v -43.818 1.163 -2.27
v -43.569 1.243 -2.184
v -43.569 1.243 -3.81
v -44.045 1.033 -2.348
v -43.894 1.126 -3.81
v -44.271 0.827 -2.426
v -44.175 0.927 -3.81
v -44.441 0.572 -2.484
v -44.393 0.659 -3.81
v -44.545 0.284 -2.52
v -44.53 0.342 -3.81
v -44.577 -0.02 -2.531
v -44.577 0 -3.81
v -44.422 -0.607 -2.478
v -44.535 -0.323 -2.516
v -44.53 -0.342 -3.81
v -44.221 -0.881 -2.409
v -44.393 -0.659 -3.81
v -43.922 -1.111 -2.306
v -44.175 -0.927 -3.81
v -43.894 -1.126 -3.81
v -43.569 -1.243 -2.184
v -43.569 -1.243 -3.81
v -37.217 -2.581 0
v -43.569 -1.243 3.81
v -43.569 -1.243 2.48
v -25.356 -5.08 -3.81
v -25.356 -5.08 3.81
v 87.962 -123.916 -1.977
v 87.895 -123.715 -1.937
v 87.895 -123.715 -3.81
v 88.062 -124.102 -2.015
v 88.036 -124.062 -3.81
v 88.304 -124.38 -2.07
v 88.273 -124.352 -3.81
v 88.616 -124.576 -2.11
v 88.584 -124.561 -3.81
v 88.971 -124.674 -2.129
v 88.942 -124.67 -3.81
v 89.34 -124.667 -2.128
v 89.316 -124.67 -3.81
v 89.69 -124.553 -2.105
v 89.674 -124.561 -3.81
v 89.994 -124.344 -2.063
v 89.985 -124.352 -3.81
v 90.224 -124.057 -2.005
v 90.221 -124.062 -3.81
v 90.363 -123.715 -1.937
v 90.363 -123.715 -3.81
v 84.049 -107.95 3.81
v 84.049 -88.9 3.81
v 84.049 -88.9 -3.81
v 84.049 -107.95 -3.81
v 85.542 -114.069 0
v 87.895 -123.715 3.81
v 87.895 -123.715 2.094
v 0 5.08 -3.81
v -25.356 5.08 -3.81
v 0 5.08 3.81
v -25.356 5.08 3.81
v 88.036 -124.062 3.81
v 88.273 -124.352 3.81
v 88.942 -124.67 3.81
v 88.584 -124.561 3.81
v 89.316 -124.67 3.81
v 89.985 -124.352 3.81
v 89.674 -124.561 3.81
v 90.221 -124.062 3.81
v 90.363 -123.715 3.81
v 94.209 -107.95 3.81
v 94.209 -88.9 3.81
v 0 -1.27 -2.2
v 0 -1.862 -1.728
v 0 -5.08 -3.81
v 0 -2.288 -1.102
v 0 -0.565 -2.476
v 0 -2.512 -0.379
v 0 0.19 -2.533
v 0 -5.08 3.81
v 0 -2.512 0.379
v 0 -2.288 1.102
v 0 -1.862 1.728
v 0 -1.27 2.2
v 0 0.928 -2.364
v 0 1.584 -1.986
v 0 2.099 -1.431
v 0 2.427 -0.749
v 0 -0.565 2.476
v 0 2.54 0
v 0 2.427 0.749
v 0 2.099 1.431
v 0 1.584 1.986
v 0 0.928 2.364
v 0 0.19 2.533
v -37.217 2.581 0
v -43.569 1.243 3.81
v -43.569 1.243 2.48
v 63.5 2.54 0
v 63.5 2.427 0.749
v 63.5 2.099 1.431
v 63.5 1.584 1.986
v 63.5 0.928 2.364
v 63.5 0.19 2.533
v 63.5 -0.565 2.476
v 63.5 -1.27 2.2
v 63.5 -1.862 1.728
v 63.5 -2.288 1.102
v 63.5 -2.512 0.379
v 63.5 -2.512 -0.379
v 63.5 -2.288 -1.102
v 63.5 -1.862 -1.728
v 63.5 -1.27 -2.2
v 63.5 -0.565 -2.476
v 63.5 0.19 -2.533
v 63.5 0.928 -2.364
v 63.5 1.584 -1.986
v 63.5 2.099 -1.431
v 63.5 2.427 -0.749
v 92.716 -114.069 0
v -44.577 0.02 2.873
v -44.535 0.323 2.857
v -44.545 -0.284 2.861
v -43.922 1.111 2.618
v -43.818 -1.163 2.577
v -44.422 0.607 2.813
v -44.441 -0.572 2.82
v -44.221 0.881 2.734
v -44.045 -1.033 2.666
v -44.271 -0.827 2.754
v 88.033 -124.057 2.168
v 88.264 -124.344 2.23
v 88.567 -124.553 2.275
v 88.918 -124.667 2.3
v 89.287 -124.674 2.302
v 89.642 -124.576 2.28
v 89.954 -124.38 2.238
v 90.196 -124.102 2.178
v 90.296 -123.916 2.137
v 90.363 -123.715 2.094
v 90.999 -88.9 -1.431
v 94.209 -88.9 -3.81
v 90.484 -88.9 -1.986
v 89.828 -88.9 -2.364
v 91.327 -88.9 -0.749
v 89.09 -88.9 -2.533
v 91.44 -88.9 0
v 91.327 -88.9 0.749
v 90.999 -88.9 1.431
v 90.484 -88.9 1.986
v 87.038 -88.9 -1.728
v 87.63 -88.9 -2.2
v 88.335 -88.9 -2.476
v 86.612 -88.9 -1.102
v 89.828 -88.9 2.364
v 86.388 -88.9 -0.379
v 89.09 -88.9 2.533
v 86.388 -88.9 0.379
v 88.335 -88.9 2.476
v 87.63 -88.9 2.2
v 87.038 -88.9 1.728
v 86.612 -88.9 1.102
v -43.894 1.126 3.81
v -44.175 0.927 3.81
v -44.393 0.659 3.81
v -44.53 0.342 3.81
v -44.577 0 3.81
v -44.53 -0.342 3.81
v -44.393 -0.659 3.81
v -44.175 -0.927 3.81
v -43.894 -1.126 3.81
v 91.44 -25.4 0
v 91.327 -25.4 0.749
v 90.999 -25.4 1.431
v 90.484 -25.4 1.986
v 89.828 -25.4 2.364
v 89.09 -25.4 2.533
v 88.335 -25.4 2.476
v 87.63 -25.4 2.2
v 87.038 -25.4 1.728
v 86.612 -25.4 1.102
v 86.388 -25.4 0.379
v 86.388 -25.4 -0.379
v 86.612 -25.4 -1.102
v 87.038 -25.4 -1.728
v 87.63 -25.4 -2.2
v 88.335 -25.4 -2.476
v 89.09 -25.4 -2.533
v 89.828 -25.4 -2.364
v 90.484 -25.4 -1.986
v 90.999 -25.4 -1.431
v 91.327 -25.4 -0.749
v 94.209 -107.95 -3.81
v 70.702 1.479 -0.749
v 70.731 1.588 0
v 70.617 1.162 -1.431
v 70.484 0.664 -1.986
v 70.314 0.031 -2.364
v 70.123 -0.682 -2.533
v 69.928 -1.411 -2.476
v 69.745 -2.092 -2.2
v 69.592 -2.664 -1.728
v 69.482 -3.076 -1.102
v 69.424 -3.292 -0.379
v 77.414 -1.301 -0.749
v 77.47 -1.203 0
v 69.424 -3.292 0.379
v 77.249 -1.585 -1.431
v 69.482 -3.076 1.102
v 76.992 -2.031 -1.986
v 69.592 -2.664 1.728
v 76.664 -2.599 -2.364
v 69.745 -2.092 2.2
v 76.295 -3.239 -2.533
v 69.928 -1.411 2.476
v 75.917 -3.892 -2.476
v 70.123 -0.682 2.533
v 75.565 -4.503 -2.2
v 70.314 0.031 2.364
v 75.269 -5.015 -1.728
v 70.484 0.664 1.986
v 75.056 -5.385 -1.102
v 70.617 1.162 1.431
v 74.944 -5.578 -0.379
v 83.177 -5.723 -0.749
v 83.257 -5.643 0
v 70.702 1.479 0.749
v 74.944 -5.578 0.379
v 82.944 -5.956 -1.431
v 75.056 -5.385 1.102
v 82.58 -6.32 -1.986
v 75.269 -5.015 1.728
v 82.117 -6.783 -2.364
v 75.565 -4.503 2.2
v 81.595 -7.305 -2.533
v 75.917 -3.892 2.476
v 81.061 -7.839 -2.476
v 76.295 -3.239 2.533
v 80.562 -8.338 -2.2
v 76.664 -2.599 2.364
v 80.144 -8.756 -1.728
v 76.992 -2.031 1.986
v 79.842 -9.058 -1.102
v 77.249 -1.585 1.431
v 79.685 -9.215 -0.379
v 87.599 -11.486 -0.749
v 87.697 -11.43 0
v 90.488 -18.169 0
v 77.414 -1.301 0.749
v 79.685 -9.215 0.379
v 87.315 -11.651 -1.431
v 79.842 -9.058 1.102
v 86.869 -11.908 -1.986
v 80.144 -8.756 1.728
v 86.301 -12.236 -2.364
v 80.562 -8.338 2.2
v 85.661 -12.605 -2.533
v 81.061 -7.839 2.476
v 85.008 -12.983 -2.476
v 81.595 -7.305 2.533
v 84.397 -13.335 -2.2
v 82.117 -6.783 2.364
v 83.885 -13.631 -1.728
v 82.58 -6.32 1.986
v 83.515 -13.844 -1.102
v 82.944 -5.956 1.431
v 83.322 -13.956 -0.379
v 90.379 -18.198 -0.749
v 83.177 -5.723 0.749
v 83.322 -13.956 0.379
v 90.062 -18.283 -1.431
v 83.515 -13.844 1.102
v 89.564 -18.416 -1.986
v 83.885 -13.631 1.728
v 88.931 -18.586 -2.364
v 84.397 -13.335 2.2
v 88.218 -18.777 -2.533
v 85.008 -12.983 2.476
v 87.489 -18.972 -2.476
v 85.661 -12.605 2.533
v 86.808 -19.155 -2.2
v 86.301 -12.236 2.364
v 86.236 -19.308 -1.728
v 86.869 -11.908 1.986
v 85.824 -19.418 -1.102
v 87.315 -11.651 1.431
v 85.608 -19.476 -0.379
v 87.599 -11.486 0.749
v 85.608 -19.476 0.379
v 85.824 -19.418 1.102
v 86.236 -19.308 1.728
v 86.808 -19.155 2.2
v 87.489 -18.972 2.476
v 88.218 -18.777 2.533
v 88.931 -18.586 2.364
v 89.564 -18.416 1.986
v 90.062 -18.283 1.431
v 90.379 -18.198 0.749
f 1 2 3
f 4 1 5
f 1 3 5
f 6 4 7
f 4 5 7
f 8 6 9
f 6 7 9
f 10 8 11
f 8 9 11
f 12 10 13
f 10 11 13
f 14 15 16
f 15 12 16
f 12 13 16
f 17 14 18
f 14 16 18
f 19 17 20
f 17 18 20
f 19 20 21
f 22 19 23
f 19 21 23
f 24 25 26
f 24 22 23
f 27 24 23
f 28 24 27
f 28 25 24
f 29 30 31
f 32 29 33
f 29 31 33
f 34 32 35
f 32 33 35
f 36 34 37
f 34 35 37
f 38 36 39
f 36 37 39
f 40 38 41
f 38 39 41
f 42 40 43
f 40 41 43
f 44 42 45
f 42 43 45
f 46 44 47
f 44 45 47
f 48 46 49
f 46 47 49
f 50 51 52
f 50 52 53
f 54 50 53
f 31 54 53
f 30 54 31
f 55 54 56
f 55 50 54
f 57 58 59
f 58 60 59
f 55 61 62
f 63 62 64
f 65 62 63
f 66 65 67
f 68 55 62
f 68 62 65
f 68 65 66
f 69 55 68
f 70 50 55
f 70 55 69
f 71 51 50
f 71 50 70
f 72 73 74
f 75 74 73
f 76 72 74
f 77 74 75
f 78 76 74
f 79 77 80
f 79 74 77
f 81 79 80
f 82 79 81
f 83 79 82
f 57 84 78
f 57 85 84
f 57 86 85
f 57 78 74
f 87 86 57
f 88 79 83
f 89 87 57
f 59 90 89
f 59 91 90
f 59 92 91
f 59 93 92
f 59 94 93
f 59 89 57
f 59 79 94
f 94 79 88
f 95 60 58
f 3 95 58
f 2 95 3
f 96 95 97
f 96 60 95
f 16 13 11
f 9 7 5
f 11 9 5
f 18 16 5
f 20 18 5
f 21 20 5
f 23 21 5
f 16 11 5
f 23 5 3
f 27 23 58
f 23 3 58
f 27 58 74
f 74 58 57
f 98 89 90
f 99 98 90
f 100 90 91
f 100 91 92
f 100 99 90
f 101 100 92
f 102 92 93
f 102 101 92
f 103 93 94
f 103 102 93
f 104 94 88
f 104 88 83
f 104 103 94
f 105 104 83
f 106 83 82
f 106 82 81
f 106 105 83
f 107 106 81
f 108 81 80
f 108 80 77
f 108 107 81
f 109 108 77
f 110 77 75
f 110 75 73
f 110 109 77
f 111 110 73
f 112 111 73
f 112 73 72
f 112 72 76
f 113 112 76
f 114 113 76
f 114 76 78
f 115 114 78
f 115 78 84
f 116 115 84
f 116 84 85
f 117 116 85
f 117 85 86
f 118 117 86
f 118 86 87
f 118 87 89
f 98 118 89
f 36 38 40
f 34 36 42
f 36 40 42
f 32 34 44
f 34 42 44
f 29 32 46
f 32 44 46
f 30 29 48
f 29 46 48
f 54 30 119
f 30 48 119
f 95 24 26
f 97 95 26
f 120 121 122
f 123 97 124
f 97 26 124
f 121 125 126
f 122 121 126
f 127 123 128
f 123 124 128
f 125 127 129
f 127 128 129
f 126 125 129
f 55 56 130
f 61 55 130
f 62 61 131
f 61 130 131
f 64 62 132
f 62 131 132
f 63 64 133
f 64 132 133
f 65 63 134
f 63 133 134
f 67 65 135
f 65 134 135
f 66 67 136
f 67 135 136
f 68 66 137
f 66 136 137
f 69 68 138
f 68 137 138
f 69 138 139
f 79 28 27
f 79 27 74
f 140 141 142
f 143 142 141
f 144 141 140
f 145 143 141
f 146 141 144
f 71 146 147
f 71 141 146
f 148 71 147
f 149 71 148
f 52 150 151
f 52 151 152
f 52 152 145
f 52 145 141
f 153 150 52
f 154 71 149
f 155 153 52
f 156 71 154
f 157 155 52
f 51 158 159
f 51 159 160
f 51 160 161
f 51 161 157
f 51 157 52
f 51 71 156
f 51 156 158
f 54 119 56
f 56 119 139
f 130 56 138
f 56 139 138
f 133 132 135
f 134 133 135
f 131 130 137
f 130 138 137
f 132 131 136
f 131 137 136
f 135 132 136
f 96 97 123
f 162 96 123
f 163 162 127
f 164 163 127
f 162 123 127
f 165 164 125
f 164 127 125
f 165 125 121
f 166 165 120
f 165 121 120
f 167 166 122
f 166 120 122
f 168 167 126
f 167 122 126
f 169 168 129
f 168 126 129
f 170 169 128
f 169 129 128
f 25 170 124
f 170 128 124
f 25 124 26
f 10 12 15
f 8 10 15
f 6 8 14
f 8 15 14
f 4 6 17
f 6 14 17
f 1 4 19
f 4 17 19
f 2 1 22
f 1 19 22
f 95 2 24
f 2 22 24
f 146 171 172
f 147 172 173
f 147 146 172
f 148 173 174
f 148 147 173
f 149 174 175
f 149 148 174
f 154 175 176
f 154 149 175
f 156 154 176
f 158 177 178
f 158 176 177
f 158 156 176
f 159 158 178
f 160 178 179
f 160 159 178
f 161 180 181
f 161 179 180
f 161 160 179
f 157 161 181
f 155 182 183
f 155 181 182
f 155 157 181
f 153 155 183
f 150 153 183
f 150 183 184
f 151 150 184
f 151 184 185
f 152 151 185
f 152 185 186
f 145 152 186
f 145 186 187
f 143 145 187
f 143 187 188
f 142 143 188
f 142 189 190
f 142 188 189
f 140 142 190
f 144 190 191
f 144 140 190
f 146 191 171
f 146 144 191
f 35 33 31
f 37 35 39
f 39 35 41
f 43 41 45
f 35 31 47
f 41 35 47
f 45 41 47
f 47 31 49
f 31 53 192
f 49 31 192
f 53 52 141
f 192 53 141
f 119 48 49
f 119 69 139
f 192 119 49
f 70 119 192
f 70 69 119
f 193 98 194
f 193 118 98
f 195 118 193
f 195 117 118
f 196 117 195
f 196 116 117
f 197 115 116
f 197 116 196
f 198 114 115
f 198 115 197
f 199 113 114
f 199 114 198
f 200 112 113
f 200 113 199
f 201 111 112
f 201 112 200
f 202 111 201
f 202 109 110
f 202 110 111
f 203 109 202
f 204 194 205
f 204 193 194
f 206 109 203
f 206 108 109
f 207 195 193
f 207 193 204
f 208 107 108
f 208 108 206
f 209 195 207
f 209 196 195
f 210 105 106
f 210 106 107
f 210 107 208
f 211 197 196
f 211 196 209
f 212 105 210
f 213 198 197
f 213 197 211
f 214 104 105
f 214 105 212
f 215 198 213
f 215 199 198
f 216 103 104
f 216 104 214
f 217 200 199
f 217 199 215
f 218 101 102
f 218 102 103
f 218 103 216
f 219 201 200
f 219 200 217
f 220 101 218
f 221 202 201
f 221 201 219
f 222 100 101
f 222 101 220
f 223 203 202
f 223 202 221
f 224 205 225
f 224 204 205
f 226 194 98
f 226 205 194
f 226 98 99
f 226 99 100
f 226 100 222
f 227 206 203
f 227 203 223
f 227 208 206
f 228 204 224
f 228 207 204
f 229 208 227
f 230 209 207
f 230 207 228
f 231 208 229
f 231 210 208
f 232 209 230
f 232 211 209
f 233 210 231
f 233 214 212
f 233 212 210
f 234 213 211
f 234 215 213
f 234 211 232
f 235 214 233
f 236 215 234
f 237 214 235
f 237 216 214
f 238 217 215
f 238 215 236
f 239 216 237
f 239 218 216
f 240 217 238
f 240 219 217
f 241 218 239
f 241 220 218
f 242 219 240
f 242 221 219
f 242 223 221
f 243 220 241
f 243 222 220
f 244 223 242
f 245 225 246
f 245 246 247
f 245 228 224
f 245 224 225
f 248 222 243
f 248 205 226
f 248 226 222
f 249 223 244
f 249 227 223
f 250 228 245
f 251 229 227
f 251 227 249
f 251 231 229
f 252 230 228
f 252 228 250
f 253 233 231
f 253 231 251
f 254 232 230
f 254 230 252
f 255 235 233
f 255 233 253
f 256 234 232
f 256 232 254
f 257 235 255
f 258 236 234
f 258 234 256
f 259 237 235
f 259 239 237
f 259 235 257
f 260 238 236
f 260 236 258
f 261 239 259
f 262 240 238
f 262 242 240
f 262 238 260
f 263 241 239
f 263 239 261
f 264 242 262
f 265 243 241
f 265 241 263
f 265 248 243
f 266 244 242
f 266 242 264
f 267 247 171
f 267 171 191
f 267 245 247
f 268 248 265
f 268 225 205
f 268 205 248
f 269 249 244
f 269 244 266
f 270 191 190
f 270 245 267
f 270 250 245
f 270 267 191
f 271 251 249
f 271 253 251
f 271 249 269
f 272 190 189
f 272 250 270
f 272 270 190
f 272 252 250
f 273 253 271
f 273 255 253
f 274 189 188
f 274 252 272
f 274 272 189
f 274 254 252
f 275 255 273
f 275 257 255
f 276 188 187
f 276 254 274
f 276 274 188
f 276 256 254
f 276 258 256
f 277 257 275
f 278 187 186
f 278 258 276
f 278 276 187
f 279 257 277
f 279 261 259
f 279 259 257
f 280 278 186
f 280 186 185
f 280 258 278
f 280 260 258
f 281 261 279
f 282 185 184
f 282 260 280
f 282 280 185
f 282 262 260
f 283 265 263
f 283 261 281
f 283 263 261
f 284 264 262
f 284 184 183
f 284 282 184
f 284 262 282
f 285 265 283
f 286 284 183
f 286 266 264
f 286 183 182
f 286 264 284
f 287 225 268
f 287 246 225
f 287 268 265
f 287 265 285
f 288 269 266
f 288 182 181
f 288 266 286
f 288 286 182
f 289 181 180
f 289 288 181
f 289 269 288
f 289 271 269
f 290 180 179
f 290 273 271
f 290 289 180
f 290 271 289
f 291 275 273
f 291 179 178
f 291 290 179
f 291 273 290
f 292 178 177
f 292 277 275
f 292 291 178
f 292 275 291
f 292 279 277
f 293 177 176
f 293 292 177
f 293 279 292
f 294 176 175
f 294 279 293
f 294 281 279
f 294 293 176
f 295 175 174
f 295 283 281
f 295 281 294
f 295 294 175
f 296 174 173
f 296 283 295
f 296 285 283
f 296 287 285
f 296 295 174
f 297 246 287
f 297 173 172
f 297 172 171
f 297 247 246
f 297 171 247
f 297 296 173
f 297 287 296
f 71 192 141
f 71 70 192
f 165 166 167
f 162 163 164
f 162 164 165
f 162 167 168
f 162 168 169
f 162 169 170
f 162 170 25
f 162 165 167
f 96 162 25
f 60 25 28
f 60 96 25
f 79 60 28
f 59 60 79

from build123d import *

# Parameters (mm, degrees)
F0_R      = 2.54
F3_W      = 25.3560190095
F3_H      = 10.16
F4_DEPTH  = 3.81
F6_DEPTH  = 7.62
F7_R      = 1.27
F9_DEPTH  = 25.4
F11_DEPTH = 3.81
F12_R     = 1.27
F14_DEPTH = 25.4


with BuildPart() as f2:
    # F2: sweep along a path in F1
    with BuildLine(Plane.XY) as f2_path:
        Line((0, 0), (63.5, 0))
        ThreePointArc((63.5, 0), (81.4605122421, -7.4394877579), (88.9, -25.4))
        Line((88.9, -25.4), (88.9, -88.9))
    # F0 (on Right) → F2 (sweep)
    with BuildSketch(Plane.YZ):
        Circle(F0_R)
    sweep(path=f2_path.line)

    # F3 (on Top) → F4 (join, symmetric)
    with BuildSketch(Plane.XY):
        with Locations((-12.6780095048, 0)):
            Rectangle(F3_W, F3_H)
    extrude(amount=F4_DEPTH, both=True)

    # F5 (on face) → F6 (join, through all)
    with BuildSketch(Plane.XY.offset(3.81)):
        Polygon((-25.3560190095, -5.08), (-25.3560190095, 5.08), (-49.4670197368, 0), align=None)
    extrude(amount=-F6_DEPTH)

    # F7
    f7_edges = [f2.edges().sort_by_distance(p)[0] for p in [
        (-49.46702, 0, 0),
    ]]
    fillet(f7_edges, radius=F7_R)

    # F8 (on face) → F9 (cut)
    with BuildSketch(Plane.XZ.offset(5.08)):
        Polygon((-46.2558194995, -3.1080117915), (-37.216514349, 0), (-46.2558194995, 3.528587753), align=None)
    extrude(amount=-F9_DEPTH, mode=Mode.SUBTRACT)

    # F10 (on Top) → F11 (join, symmetric)
    with BuildSketch(Plane.XY):
        Polygon((94.2088630664, -88.9), (84.0488630664, -88.9), (84.0488630664, -107.95), (89.1288630664, -128.7725716829), (94.2088630664, -107.95), align=None)
    extrude(amount=F11_DEPTH, both=True)

    # F12
    f12_edges = [f2.edges().sort_by_distance(p)[0] for p in [
        (89.128863, -128.772572, 0),
    ]]
    fillet(f12_edges, radius=F12_R)

    # F13 (on face) → F14 (cut)
    with BuildSketch(Plane.YZ.offset(94.2088630664)):
        Polygon((-128.7030428648, -2.9382649809), (-114.0688881278, 0), (-128.7030428648, 3.176004393), align=None)
    extrude(amount=-F14_DEPTH, mode=Mode.SUBTRACT)


solid = f2.part
